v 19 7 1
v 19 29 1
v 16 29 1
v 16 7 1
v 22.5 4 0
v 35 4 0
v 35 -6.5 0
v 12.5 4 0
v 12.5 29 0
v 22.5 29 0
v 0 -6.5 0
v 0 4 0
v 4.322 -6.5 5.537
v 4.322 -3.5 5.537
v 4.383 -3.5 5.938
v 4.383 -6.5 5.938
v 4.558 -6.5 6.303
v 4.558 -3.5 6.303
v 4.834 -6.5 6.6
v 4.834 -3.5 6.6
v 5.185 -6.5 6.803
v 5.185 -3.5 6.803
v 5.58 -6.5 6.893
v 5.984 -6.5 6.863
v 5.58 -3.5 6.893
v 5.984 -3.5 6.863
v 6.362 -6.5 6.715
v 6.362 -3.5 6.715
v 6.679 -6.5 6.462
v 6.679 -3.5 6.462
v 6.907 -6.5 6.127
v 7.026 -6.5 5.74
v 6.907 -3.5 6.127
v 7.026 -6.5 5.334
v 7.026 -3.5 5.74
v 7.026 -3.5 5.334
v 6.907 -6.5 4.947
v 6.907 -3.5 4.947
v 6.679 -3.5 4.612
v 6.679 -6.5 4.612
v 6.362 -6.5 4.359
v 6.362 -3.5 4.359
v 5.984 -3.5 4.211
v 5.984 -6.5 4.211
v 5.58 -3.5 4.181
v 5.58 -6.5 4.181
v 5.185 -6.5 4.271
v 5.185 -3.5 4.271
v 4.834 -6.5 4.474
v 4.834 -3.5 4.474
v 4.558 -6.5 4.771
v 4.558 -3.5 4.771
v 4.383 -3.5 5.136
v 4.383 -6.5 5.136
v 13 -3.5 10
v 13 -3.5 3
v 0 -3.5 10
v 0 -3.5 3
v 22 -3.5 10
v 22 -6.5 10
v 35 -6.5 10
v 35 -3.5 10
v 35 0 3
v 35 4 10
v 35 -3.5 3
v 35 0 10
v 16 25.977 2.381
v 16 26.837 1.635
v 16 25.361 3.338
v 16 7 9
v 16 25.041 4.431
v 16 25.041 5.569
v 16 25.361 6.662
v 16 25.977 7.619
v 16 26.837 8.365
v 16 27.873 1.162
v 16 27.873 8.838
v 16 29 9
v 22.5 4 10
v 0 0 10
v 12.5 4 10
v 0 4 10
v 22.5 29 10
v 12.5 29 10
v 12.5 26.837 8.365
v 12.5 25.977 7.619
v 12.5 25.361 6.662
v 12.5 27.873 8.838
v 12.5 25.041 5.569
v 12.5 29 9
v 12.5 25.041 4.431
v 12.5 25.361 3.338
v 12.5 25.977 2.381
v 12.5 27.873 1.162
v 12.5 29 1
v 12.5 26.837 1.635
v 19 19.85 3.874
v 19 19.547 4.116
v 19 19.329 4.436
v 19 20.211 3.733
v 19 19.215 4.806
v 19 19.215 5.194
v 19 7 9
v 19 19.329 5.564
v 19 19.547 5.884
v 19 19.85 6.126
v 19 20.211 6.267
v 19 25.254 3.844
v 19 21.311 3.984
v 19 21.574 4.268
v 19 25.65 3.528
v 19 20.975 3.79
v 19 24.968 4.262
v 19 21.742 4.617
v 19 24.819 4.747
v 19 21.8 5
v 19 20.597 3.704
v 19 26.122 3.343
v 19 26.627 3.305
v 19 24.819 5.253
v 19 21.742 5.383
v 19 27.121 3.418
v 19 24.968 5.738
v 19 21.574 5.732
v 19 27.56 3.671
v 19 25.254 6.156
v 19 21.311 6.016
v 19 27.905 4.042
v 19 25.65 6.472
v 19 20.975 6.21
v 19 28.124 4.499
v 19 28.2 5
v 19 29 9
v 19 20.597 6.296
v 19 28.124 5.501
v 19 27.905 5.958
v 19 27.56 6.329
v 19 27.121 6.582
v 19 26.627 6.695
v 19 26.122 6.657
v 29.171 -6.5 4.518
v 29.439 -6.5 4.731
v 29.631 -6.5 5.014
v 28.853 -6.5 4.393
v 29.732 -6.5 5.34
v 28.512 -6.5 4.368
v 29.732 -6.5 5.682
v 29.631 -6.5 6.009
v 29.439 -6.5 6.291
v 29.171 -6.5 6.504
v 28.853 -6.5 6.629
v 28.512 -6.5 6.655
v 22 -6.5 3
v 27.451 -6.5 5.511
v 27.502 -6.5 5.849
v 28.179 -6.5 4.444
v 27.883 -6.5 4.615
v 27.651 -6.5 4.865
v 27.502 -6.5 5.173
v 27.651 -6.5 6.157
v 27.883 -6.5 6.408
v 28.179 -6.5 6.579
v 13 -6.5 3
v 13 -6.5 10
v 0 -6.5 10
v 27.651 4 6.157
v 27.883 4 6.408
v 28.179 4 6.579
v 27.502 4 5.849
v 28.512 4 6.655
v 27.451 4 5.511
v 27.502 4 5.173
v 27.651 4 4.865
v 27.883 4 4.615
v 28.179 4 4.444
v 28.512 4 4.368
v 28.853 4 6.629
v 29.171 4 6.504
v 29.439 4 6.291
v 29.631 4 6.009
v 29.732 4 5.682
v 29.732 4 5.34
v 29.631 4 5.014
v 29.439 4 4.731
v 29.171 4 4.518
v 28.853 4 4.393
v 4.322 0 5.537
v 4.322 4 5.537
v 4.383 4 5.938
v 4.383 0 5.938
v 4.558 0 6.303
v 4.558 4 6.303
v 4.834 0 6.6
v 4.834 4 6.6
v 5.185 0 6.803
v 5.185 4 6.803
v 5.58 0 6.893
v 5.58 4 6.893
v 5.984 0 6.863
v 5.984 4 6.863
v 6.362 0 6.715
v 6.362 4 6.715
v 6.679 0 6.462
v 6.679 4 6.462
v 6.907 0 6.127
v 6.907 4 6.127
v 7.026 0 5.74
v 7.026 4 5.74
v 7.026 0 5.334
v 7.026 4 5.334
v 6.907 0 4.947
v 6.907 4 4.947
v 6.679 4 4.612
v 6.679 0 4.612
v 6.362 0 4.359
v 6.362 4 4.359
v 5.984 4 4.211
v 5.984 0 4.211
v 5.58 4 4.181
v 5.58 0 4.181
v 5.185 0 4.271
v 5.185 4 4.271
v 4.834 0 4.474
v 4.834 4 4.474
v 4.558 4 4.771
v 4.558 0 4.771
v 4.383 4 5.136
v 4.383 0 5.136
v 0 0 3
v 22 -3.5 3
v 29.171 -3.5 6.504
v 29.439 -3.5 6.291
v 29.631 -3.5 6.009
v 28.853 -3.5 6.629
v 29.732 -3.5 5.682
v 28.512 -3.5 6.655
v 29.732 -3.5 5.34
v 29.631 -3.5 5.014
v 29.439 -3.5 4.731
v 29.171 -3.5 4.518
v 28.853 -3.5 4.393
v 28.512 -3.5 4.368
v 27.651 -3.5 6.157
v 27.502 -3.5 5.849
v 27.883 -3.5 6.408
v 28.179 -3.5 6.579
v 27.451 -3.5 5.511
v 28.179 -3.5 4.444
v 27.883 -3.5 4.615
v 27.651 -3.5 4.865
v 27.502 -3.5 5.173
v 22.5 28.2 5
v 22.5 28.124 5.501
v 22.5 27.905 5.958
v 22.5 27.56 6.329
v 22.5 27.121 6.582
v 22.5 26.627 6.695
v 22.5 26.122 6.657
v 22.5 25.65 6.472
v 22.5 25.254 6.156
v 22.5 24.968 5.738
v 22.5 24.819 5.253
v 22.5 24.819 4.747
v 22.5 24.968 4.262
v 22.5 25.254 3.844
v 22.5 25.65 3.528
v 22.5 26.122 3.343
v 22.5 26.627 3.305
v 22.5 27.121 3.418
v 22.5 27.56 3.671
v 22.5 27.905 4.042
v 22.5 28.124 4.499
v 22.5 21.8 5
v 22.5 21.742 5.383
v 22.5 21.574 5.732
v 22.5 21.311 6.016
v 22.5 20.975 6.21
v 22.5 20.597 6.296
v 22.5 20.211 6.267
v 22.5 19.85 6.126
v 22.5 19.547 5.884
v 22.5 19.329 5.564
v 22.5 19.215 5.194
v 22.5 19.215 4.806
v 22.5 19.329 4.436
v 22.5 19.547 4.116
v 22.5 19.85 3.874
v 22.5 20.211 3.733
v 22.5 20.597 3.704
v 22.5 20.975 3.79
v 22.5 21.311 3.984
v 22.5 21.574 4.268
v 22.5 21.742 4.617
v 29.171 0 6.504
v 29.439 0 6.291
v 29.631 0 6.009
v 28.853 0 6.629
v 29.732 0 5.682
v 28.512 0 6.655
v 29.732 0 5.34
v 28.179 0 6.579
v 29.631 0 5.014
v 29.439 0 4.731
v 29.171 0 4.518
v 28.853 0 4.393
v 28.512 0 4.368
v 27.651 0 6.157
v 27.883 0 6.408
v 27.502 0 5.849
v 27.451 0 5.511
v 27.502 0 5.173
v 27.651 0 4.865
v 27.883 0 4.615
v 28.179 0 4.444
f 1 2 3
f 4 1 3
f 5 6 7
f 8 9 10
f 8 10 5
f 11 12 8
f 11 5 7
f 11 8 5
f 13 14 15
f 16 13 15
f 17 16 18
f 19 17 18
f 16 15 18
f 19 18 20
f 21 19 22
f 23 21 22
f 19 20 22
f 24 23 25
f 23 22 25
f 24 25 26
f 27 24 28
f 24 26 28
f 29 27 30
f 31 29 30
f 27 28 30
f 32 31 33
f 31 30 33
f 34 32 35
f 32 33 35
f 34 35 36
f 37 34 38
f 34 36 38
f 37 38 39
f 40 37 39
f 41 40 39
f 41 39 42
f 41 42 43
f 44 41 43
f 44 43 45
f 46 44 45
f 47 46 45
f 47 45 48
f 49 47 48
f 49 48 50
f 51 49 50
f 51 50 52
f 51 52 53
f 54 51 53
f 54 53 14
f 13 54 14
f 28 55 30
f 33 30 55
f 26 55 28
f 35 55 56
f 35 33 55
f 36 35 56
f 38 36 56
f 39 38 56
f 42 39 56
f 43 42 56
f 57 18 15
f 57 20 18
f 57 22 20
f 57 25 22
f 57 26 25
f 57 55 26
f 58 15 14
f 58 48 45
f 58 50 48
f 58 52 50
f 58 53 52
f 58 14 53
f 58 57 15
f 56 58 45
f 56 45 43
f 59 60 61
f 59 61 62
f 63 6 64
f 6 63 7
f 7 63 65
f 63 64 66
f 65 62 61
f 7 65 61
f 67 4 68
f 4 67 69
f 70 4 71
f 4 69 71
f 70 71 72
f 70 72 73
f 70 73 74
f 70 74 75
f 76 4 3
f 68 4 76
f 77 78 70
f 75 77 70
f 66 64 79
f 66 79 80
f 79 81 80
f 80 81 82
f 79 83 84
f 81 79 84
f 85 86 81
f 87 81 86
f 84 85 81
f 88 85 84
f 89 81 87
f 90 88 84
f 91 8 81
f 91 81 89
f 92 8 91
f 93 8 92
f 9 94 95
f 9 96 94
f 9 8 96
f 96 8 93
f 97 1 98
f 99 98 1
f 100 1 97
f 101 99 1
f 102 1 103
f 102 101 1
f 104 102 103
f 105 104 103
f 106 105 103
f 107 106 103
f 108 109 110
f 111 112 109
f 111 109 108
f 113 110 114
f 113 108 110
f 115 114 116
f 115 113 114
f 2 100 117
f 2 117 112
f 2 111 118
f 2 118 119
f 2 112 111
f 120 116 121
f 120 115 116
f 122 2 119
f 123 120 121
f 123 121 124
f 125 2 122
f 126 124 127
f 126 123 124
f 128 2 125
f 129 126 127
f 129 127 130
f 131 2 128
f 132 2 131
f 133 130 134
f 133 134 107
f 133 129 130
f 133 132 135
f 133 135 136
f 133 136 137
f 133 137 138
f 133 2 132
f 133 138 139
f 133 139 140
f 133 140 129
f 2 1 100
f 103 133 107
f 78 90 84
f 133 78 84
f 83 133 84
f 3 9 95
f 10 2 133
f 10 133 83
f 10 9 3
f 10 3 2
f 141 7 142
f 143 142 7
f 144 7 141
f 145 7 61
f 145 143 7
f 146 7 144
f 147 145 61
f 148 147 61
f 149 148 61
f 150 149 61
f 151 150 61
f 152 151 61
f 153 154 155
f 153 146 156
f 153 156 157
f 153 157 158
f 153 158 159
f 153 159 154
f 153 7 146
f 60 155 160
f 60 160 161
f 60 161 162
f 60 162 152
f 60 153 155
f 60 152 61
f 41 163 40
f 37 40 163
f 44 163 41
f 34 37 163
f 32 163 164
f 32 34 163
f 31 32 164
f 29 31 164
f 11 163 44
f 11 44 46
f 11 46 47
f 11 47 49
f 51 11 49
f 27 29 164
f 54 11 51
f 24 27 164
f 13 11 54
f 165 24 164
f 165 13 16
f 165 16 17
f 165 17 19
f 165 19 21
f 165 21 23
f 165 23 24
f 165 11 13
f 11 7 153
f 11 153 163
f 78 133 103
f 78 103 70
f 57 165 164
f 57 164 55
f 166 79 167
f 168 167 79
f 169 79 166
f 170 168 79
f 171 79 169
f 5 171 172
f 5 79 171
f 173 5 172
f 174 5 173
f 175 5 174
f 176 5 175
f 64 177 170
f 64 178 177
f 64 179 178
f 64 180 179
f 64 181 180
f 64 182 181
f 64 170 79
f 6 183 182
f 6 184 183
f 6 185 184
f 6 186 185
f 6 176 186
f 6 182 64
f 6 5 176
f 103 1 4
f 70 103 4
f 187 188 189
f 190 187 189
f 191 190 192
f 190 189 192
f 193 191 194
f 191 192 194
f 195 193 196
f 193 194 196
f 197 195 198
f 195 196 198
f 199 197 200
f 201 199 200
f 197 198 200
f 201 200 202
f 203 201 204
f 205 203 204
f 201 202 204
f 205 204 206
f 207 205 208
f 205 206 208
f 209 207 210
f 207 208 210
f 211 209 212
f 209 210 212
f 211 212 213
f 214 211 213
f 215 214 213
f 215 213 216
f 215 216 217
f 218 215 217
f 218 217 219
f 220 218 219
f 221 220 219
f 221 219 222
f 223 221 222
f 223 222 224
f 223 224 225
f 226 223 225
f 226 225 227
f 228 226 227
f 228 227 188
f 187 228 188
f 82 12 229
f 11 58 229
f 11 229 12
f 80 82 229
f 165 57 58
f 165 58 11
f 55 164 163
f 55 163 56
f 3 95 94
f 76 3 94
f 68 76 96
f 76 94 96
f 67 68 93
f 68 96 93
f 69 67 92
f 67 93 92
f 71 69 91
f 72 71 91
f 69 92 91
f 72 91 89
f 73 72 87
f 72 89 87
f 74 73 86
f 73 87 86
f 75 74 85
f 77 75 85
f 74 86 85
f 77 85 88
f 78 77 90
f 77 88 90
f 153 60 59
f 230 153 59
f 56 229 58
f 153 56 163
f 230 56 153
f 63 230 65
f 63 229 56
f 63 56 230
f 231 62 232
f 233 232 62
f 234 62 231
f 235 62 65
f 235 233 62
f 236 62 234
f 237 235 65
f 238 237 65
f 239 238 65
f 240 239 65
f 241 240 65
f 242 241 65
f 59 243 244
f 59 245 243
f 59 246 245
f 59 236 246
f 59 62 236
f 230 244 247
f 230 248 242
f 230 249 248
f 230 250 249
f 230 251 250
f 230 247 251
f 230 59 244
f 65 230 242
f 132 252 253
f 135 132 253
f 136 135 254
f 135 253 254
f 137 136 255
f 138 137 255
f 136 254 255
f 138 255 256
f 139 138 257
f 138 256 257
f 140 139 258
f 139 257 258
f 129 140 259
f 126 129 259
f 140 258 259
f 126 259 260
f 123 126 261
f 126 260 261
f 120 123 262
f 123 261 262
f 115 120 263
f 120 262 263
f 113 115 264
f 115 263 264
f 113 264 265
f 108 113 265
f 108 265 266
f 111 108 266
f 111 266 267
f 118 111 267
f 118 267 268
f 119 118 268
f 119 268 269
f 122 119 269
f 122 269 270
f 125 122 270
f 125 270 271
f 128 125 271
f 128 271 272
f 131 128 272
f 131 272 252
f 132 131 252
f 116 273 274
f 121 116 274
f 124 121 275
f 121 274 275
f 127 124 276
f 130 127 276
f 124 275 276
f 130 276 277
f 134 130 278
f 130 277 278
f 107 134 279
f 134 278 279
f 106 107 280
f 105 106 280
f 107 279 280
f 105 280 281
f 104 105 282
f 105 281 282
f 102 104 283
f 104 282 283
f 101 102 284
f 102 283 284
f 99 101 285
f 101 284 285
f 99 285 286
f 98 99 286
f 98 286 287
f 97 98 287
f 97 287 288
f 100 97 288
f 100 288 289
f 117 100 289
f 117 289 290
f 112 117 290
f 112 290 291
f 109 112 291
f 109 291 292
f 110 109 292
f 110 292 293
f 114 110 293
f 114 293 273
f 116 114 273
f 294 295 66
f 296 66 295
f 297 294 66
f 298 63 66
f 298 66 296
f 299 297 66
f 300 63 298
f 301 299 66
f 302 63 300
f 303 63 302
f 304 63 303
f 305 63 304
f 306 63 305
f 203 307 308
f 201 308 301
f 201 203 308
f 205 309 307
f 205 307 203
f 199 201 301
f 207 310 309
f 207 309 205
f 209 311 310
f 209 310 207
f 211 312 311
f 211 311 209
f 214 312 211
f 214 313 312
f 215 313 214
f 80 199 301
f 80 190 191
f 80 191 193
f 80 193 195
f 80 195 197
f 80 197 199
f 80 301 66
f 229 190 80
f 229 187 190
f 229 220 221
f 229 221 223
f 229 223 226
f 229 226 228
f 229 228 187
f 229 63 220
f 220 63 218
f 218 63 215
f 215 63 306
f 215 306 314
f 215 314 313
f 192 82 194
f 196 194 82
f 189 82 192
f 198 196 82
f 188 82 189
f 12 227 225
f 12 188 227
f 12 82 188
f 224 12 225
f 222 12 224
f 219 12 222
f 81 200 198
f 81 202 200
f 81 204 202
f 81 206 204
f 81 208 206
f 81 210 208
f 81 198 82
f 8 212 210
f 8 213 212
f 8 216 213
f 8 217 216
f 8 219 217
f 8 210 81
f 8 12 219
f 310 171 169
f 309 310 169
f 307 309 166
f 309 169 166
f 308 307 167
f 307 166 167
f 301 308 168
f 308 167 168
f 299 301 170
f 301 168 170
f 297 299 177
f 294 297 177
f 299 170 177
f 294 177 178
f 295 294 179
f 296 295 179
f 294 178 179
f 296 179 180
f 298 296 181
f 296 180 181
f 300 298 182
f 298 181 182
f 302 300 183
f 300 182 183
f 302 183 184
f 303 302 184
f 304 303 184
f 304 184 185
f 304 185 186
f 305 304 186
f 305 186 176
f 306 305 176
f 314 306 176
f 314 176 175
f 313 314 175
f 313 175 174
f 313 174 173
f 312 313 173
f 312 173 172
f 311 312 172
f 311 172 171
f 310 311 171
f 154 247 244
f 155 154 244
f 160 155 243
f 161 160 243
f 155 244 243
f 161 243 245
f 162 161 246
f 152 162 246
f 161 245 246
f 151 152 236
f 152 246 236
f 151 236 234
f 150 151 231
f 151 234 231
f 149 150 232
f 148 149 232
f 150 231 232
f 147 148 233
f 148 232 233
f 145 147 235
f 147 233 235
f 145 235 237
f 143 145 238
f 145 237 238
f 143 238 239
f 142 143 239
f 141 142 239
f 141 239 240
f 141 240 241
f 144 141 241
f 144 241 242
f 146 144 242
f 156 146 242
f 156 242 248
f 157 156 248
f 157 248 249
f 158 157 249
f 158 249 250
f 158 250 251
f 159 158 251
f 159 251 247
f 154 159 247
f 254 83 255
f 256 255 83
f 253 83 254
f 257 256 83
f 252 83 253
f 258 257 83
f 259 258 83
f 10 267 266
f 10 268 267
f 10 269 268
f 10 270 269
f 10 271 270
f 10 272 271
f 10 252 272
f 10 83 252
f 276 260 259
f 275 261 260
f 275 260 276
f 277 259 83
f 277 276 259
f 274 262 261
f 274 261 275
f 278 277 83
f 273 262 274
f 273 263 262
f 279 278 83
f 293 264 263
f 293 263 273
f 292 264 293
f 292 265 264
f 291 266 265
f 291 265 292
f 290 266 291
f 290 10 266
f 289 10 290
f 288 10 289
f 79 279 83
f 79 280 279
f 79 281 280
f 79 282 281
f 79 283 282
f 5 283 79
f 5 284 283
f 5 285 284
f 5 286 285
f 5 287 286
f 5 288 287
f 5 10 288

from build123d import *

# Parameters (mm, degrees)
PAD_DEPTH       = 10
SKETCH001_W     = 3
SKETCH001_H     = 8
POCKET_DEPTH    = 22
POCKET001_DEPTH = 5
SKETCH003_R     = 1.7
POCKET002_DEPTH = 5
PAD001_DEPTH    = 35
SKETCH005_W     = 9
SKETCH005_H     = 3
POCKET003_DEPTH = 7
SKETCH009_R     = 1.146705
SKETCH009_R_2   = 1.359748
POCKET005_DEPTH = 10.501
SKETCH010_R     = 1.3
POCKET006_DEPTH = 5


with BuildPart() as part:
    # Sketch → Pad (new body)
    with BuildSketch(Plane.XY):
        Polygon((12.5, 29), (22.5, 29), (22.5, 4), (35, 4), (35, 0), (0, 0), (0, 4), (12.5, 4), align=None)
    extrude(amount=PAD_DEPTH)

    # Sketch001 → Pocket (cut)
    with BuildSketch(Plane(origin=(0, 29, 0), x_dir=(-1, 0, 0), z_dir=(0, 1, 0))):
        with Locations((-17.5, 5)):
            Rectangle(SKETCH001_W, SKETCH001_H)
    extrude(amount=-POCKET_DEPTH, mode=Mode.SUBTRACT)

    # Sketch002 → Pocket001 (cut)
    with BuildSketch(Plane(origin=(12.5, 0, 0), x_dir=(0, -1, 0), z_dir=(-1, 0, 0))):
        with BuildLine():
            ThreePointArc((-29, 1), (-25, 5), (-29, 9))
            Line((-29, 9), (-29, 1))
        make_face()
    extrude(amount=-POCKET001_DEPTH, mode=Mode.SUBTRACT)

    # Sketch003 → Pocket002 (cut)
    with BuildSketch(Plane.YZ.offset(22.5)):
        with Locations((26.5, 5)):
            Circle(SKETCH003_R)
    extrude(amount=-POCKET002_DEPTH, mode=Mode.SUBTRACT)

    # Sketch004 → Pad001 (new body)
    with BuildSketch(Plane(origin=(0, 0, 0), x_dir=(0, -1, 0), z_dir=(-1, 0, 0))):
        Polygon((0, 0), (6.5, 0), (6.5, 10), (3.5, 10), (3.5, 3), (0, 3), align=None)
    extrude(amount=-PAD001_DEPTH)

    # Sketch005 → Pocket003 (cut)
    with BuildSketch(Plane.XY.offset(10)):
        with Locations((17.5, -5)):
            Rectangle(SKETCH005_W, SKETCH005_H)
    extrude(amount=-POCKET003_DEPTH, mode=Mode.SUBTRACT)

    # Sketch009 → Pocket005 (cut, through all)
    with BuildSketch(Plane(origin=(0, 4, 0), x_dir=(-1, 0, 0), z_dir=(0, 1, 0))):
        with Locations((-28.59808, 5.511153)):
            Circle(SKETCH009_R)
        with Locations((-5.681909, 5.536989)):
            Circle(SKETCH009_R_2)
    extrude(amount=-POCKET005_DEPTH, mode=Mode.SUBTRACT)

    # Sketch010 → Pocket006 (cut)
    with BuildSketch(Plane.YZ.offset(22.5)):
        with Locations((20.5, 5)):
            Circle(SKETCH010_R)
    extrude(amount=-POCKET006_DEPTH, mode=Mode.SUBTRACT)


solid = part.part
